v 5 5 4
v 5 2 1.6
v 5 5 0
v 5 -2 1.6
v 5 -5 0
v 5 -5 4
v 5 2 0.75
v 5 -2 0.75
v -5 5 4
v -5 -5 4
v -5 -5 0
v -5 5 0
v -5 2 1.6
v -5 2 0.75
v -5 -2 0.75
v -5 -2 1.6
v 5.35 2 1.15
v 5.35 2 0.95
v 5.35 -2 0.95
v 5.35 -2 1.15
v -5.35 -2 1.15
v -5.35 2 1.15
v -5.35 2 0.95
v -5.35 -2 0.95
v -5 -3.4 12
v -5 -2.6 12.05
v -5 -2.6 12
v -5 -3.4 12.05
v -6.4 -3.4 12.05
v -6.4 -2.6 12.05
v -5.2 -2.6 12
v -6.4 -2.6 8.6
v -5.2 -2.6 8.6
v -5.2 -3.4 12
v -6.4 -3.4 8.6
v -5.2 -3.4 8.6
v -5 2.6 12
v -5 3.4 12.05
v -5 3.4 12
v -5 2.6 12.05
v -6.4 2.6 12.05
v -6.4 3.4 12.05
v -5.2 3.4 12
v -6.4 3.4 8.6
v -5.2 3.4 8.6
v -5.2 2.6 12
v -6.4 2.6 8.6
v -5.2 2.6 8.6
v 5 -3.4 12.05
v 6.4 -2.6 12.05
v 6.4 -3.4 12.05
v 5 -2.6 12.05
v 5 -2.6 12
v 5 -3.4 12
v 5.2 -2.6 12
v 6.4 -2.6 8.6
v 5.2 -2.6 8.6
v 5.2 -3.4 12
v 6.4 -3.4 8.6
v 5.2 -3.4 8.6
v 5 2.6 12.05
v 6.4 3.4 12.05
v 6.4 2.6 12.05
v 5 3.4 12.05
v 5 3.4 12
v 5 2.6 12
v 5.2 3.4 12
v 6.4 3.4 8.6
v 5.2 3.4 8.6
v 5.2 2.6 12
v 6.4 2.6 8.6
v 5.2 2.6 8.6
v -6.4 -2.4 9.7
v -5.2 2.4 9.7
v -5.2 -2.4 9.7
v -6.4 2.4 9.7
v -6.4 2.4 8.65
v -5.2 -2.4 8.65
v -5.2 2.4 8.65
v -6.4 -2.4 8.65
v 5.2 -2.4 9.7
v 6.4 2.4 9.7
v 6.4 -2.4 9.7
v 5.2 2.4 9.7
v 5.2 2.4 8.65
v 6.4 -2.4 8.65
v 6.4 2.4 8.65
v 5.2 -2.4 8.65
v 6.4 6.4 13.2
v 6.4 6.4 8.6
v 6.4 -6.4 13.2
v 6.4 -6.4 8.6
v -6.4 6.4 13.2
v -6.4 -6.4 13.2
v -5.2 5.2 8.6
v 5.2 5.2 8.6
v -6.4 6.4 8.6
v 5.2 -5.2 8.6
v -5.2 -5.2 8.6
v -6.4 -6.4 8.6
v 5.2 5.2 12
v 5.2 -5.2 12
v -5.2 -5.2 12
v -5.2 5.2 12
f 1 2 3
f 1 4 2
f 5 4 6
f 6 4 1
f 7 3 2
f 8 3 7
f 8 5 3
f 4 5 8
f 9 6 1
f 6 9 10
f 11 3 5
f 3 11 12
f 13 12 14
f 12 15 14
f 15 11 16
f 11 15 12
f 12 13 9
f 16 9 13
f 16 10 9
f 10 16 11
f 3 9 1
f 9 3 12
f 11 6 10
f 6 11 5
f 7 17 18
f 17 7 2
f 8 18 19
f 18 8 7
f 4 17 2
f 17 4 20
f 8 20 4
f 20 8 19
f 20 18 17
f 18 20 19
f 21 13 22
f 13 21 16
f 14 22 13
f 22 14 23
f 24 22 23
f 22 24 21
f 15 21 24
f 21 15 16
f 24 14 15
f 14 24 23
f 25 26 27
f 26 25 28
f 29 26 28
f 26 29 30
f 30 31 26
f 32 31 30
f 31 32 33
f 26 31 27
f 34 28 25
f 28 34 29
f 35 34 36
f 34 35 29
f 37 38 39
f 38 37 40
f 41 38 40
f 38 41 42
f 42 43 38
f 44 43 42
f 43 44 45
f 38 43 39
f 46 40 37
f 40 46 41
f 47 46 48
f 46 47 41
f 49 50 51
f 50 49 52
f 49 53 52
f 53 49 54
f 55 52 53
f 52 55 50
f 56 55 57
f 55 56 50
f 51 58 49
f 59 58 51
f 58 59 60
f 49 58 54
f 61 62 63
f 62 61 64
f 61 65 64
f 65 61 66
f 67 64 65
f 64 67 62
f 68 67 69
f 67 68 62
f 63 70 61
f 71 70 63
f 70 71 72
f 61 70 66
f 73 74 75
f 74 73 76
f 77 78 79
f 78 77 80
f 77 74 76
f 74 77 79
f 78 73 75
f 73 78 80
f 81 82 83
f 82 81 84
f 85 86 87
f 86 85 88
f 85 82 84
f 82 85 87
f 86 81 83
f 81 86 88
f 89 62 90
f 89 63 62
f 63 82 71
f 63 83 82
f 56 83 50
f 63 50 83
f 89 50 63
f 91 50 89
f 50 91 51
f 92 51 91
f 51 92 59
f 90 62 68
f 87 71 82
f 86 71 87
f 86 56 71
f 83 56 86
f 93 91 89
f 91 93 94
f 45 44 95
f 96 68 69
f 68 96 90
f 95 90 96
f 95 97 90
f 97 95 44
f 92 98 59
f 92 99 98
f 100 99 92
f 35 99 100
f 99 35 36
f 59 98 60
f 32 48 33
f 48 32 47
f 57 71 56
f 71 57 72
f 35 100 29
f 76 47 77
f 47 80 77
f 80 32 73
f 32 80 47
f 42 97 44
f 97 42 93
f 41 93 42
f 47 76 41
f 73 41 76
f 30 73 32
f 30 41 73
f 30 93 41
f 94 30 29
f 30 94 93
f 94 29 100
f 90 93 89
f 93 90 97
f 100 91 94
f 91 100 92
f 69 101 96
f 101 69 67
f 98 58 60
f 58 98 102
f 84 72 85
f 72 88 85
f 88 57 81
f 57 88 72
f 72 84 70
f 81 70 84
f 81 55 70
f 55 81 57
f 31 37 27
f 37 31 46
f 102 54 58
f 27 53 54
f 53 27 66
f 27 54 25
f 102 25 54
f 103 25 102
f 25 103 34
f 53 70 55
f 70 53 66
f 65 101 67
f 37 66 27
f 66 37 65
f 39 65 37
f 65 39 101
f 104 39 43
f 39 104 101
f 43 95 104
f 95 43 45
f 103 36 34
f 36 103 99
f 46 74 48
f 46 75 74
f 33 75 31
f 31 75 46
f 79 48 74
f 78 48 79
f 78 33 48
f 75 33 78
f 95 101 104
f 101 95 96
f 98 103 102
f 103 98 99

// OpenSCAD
// file: ../lib/at01_inverted_core_snap.scad
// File: at01_inverted_core_snap.scad
// AT-01 — experiment-owned inverted fixed-core / removable-shell snap.
//
// This geometry does not copy the QuackWorks/OpenGrid snap. It keeps only the
// high-level design lessons: compact fixed side, removable compliant side,
// explicit locating/retention roles, and a Lite-like 4.0 / 3.4 mm Z baseline.

// Fixed-side baseline.
AT01_CORE_SIZE = 10.0;
AT01_CORE_HEIGHT = 4.0;
AT01_ROOT_SHOULDER = 0.6;
AT01_ENGAGEMENT_HEIGHT = 3.4;

// Removable shell.
AT01_CLEARANCE = 0.20;              // per side on nominal 10 x 10 core
AT01_SHELL_WALL = 1.20;
AT01_SHELL_TOP = 1.20;
AT01_SHELL_INNER = AT01_CORE_SIZE + 2 * AT01_CLEARANCE;
AT01_SHELL_OUTER = AT01_SHELL_INNER + 2 * AT01_SHELL_WALL;
AT01_SHELL_HEIGHT = AT01_ENGAGEMENT_HEIGHT + AT01_SHELL_TOP;

// Two-sided retention on +/-X.
AT01_RIB_PROTRUSION = 0.35;
AT01_RIB_WIDTH = 4.0;
AT01_RIB_Z_BOTTOM = 0.75;
AT01_RIB_Z_LOWER_MAX = 0.95;
AT01_RIB_Z_UPPER_MAX = 1.15;
AT01_RIB_Z_TOP = 1.60;

// Receiving window in each compliant shell tongue.
// Values are shell-local; assembled shell starts at Z=AT01_ROOT_SHOULDER.
AT01_WINDOW_WIDTH = 4.8;
AT01_WINDOW_Z_MIN = 0.05;
AT01_WINDOW_Z_MAX = 1.10;

// Two relief slots isolate the center tongue on each +/-X wall.
AT01_FLEX_SLOT_Y = 3.0;
AT01_FLEX_SLOT_WIDTH = 0.8;

// Evidence helpers.
AT01_EXPLODED_Z = 8.0;
AT01_PROFILE_SLICE = 1.0;

assert(
    abs(AT01_ROOT_SHOULDER + AT01_ENGAGEMENT_HEIGHT - AT01_CORE_HEIGHT) < 0.0001,
    "AT-01 Lite baseline must satisfy shoulder + engagement = 4.0 mm."
);
assert(
    abs(AT01_SHELL_INNER - (AT01_CORE_SIZE + 2 * AT01_CLEARANCE)) < 0.0001,
    "AT-01 shell inner size must preserve the stated side clearance."
);

module _at01_positive_x_retention_rib() {
    // Polygon is defined in X/Z and extruded along Y.
    rotate([90, 0, 0])
        linear_extrude(height = AT01_RIB_WIDTH, center = true, convexity = 10)
            polygon(points = [
                [AT01_CORE_SIZE / 2, AT01_RIB_Z_BOTTOM],
                [AT01_CORE_SIZE / 2 + AT01_RIB_PROTRUSION, AT01_RIB_Z_LOWER_MAX],
                [AT01_CORE_SIZE / 2 + AT01_RIB_PROTRUSION, AT01_RIB_Z_UPPER_MAX],
                [AT01_CORE_SIZE / 2, AT01_RIB_Z_TOP]
            ]);
}

module at01_fixed_core() {
    union() {
        translate([-AT01_CORE_SIZE / 2, -AT01_CORE_SIZE / 2, 0])
            cube([AT01_CORE_SIZE, AT01_CORE_SIZE, AT01_CORE_HEIGHT]);

        _at01_positive_x_retention_rib();

        mirror([1, 0, 0])
            _at01_positive_x_retention_rib();
    }
}

module _at01_shell_outer() {
    translate([-AT01_SHELL_OUTER / 2, -AT01_SHELL_OUTER / 2, 0])
        cube([AT01_SHELL_OUTER, AT01_SHELL_OUTER, AT01_SHELL_HEIGHT]);
}

module _at01_shell_cavity() {
    // Ends exactly at the underside of the top plate.
    translate([-AT01_SHELL_INNER / 2, -AT01_SHELL_INNER / 2, -0.05])
        cube([AT01_SHELL_INNER, AT01_SHELL_INNER, AT01_ENGAGEMENT_HEIGHT + 0.05]);
}

module _at01_retention_window(x_sign = 1) {
    wall_center = (AT01_SHELL_INNER / 2 + AT01_SHELL_OUTER / 2) / 2;
    translate([
        x_sign * wall_center,
        0,
        (AT01_WINDOW_Z_MIN + AT01_WINDOW_Z_MAX) / 2
    ])
        cube([
            AT01_SHELL_WALL + 0.4,
            AT01_WINDOW_WIDTH,
            AT01_WINDOW_Z_MAX - AT01_WINDOW_Z_MIN
        ], center = true);
}

module _at01_flex_slot(x_sign = 1, y_sign = 1) {
    wall_center = (AT01_SHELL_INNER / 2 + AT01_SHELL_OUTER / 2) / 2;
    translate([
        x_sign * wall_center,
        y_sign * AT01_FLEX_SLOT_Y,
        AT01_ENGAGEMENT_HEIGHT / 2
    ])
        cube([
            AT01_SHELL_WALL + 0.4,
            AT01_FLEX_SLOT_WIDTH,
            AT01_ENGAGEMENT_HEIGHT + 0.10
        ], center = true);
}

module at01_removable_shell() {
    difference() {
        _at01_shell_outer();
        _at01_shell_cavity();

        for (x_sign = [-1, 1]) {
            _at01_retention_window(x_sign);

            for (y_sign = [-1, 1])
                _at01_flex_slot(x_sign, y_sign);
        }
    }
}

module at01_assembled(shell_alpha = 0.55) {
    color([0.68, 0.70, 0.74])
        at01_fixed_core();

    translate([0, 0, AT01_ROOT_SHOULDER])
        color([0.92, 0.30, 0.12, shell_alpha])
            at01_removable_shell();
}

module at01_exploded() {
    color([0.68, 0.70, 0.74])
        at01_fixed_core();

    translate([0, 0, AT01_ROOT_SHOULDER + AT01_EXPLODED_Z])
        color([0.92, 0.30, 0.12])
            at01_removable_shell();
}

module _at01_retention_slice_volume() {
    translate([-20, -AT01_PROFILE_SLICE / 2, -1])
        cube([40, AT01_PROFILE_SLICE, 12]);
}

module _at01_locating_slice_volume() {
    translate([-AT01_PROFILE_SLICE / 2, -20, -1])
        cube([AT01_PROFILE_SLICE, 40, 12]);
}

module at01_fixed_retention_profile() {
    intersection() {
        at01_fixed_core();
        _at01_retention_slice_volume();
    }
}

module at01_shell_retention_profile() {
    intersection() {
        at01_removable_shell();
        translate([0, 0, -AT01_ROOT_SHOULDER])
            _at01_retention_slice_volume();
    }
}

module at01_fixed_locating_profile() {
    intersection() {
        at01_fixed_core();
        _at01_locating_slice_volume();
    }
}

module at01_shell_locating_profile() {
    intersection() {
        at01_removable_shell();
        translate([0, 0, -AT01_ROOT_SHOULDER])
            _at01_locating_slice_volume();
    }
}

module at01_retention_section() {
    color([0.68, 0.70, 0.74])
        at01_fixed_retention_profile();

    translate([0, 0, AT01_ROOT_SHOULDER])
        color([0.92, 0.30, 0.12])
            at01_shell_retention_profile();
}

module at01_locating_section() {
    color([0.68, 0.70, 0.74])
        at01_fixed_locating_profile();

    translate([0, 0, AT01_ROOT_SHOULDER])
        color([0.92, 0.30, 0.12])
            at01_shell_locating_profile();
}
// main file
include <../lib/at01_inverted_core_snap.scad>
$vpt=[0,0,6]; $vpr=[68,0,35]; $vpd=68;
at01_exploded();
